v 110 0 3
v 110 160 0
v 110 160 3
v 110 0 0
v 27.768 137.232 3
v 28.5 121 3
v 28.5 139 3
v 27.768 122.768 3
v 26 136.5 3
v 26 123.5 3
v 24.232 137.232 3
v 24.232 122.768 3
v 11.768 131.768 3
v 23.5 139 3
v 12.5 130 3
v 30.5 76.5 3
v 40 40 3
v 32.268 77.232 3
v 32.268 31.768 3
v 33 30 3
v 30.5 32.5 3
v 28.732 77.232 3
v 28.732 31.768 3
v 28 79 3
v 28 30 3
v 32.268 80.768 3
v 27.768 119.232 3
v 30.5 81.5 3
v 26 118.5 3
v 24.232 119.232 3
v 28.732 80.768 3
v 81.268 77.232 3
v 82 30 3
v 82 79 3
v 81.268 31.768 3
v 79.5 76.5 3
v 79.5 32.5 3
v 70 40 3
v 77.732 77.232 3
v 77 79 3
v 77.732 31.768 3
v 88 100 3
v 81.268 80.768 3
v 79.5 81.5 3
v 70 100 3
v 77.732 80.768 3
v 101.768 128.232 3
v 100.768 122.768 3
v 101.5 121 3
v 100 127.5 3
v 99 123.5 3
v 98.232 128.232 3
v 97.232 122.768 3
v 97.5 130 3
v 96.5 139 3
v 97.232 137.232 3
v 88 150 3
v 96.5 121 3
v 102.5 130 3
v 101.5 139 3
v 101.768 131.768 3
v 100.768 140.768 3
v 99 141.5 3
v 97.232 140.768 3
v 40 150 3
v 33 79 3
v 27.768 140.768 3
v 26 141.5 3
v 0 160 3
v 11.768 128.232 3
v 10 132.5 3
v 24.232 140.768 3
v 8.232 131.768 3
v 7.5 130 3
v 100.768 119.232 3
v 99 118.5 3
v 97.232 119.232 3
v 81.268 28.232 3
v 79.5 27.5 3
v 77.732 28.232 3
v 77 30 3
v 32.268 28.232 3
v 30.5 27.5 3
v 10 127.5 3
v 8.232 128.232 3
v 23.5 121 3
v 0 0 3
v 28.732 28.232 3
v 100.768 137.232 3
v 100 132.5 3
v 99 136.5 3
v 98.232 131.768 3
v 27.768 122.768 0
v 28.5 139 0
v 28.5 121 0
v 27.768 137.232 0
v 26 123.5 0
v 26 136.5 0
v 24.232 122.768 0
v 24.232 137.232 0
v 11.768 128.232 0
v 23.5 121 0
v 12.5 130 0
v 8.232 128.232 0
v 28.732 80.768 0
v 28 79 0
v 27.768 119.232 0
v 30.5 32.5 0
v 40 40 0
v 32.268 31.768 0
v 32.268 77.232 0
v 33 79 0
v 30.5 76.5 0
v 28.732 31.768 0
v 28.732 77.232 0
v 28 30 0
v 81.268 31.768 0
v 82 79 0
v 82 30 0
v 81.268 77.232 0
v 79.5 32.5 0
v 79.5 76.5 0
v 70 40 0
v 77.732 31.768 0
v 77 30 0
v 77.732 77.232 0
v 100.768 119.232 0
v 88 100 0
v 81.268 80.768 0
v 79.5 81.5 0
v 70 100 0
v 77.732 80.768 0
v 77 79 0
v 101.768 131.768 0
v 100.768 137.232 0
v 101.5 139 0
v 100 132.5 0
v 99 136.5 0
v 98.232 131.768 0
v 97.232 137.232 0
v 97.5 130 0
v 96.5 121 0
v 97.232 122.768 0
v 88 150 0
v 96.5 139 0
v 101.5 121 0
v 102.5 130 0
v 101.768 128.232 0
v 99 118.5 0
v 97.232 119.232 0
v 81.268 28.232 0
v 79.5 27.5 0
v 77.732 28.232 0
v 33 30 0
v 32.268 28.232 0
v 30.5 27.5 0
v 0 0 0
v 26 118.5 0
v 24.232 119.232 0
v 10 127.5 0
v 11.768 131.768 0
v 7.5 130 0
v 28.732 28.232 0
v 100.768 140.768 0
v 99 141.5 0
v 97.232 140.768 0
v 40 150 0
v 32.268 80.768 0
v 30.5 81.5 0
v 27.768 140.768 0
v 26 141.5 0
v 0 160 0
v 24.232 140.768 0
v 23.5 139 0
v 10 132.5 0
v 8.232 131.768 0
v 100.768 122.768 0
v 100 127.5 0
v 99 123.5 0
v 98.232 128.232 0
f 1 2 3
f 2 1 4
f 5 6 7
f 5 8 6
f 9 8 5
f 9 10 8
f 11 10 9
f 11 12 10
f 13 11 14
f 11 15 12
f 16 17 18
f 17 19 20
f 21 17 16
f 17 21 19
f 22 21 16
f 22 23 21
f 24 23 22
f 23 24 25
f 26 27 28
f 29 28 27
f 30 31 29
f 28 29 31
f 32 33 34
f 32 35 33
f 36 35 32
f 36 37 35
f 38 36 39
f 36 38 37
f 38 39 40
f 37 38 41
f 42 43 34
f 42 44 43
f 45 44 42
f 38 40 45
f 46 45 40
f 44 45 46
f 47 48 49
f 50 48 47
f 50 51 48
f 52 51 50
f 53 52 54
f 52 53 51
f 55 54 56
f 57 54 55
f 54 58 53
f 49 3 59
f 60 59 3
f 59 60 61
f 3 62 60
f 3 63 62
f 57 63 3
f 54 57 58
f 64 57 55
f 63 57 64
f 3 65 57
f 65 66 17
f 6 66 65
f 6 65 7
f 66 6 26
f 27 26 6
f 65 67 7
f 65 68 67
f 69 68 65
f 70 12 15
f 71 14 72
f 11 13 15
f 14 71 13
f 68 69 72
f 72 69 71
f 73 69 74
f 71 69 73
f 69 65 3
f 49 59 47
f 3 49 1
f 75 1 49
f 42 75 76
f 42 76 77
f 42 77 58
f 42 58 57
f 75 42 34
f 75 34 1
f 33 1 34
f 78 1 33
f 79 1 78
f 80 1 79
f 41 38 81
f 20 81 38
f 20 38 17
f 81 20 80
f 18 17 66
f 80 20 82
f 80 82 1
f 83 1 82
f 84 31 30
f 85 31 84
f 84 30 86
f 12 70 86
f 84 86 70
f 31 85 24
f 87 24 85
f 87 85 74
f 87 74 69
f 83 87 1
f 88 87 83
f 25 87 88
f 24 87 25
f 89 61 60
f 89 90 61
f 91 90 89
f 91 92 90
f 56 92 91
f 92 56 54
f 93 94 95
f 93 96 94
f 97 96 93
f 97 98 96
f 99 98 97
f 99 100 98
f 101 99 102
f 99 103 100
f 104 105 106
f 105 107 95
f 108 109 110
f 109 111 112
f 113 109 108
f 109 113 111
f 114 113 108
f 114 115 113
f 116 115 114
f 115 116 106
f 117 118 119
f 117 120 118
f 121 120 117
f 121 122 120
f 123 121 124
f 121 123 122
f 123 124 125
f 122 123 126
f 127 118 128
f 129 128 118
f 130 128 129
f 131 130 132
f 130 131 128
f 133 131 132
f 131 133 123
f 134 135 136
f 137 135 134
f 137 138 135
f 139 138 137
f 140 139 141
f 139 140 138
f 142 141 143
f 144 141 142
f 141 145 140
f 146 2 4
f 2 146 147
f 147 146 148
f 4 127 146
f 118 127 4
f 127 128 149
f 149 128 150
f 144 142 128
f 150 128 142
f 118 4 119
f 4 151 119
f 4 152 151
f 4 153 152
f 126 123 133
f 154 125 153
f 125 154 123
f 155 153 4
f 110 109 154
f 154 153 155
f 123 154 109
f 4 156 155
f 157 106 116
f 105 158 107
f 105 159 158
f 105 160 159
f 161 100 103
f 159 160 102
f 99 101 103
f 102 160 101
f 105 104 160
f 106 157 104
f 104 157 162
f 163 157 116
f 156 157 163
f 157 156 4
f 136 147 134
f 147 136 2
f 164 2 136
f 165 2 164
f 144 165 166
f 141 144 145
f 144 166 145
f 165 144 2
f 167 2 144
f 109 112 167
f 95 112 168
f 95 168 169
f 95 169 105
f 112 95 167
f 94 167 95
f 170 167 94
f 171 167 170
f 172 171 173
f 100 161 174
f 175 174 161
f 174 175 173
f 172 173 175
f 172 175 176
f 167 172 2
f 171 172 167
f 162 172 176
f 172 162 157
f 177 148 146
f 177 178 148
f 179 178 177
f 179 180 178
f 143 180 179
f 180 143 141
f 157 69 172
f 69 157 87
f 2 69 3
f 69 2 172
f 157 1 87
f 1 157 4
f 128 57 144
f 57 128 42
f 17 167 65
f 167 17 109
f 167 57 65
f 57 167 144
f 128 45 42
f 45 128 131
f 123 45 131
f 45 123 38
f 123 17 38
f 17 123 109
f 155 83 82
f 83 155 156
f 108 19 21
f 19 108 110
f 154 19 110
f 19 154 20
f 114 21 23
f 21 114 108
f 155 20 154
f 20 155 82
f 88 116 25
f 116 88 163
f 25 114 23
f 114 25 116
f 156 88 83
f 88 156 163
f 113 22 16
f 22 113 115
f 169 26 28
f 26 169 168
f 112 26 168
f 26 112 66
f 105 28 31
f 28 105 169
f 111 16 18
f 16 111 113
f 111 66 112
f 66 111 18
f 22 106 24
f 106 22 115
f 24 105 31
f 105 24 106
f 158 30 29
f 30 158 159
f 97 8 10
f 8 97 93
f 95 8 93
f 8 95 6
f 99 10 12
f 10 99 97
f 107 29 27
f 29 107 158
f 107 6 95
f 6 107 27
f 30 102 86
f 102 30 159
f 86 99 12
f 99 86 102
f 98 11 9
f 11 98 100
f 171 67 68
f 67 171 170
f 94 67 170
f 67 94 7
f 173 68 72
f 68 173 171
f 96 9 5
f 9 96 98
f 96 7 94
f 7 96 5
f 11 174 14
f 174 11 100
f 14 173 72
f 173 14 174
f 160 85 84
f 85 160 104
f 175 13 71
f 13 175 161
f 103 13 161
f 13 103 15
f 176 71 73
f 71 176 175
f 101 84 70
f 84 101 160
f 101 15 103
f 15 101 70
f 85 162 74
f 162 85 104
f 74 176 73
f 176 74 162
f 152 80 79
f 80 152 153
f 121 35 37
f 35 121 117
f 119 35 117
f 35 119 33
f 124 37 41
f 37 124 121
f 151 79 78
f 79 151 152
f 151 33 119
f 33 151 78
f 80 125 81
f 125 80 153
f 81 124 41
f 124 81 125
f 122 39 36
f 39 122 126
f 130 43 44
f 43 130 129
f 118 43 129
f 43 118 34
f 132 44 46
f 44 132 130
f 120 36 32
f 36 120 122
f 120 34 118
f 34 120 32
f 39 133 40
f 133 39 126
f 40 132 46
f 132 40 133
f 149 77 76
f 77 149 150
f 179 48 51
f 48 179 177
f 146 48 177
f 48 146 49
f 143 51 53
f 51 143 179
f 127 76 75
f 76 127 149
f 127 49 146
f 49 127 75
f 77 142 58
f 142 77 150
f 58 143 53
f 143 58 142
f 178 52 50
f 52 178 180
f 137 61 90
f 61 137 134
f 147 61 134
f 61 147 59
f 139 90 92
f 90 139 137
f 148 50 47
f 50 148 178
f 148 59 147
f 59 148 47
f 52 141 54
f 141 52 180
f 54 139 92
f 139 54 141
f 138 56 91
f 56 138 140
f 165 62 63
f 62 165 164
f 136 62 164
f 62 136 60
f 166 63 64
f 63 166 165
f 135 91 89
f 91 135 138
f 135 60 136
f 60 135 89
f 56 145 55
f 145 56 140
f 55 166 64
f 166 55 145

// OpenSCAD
difference(){
    cube([110,160, 3]);
    translate([40,100,0])cube([48,50,6]);
    translate([40,40,0])cube([30,60,6]);
    translate([30.5,30,0])cylinder(d=5,h=8);
    translate([30.5,79,0])cylinder(d=5,h=8);
    
    translate([26,121,0])cylinder(d=5,h=8);
    translate([26,139,0])cylinder(d=5,h=8);
    
    translate([10,130,0])cylinder(d=5,h=8);
    
    translate([79.5,30,0])cylinder(d=5,h=8);
    translate([79.5,79,0])cylinder(d=5,h=8);
    
    translate([99,121,0])cylinder(d=5,h=8);
    translate([100,130,0])cylinder(d=5,h=8);
    translate([99,139,0])cylinder(d=5,h=8);
}
